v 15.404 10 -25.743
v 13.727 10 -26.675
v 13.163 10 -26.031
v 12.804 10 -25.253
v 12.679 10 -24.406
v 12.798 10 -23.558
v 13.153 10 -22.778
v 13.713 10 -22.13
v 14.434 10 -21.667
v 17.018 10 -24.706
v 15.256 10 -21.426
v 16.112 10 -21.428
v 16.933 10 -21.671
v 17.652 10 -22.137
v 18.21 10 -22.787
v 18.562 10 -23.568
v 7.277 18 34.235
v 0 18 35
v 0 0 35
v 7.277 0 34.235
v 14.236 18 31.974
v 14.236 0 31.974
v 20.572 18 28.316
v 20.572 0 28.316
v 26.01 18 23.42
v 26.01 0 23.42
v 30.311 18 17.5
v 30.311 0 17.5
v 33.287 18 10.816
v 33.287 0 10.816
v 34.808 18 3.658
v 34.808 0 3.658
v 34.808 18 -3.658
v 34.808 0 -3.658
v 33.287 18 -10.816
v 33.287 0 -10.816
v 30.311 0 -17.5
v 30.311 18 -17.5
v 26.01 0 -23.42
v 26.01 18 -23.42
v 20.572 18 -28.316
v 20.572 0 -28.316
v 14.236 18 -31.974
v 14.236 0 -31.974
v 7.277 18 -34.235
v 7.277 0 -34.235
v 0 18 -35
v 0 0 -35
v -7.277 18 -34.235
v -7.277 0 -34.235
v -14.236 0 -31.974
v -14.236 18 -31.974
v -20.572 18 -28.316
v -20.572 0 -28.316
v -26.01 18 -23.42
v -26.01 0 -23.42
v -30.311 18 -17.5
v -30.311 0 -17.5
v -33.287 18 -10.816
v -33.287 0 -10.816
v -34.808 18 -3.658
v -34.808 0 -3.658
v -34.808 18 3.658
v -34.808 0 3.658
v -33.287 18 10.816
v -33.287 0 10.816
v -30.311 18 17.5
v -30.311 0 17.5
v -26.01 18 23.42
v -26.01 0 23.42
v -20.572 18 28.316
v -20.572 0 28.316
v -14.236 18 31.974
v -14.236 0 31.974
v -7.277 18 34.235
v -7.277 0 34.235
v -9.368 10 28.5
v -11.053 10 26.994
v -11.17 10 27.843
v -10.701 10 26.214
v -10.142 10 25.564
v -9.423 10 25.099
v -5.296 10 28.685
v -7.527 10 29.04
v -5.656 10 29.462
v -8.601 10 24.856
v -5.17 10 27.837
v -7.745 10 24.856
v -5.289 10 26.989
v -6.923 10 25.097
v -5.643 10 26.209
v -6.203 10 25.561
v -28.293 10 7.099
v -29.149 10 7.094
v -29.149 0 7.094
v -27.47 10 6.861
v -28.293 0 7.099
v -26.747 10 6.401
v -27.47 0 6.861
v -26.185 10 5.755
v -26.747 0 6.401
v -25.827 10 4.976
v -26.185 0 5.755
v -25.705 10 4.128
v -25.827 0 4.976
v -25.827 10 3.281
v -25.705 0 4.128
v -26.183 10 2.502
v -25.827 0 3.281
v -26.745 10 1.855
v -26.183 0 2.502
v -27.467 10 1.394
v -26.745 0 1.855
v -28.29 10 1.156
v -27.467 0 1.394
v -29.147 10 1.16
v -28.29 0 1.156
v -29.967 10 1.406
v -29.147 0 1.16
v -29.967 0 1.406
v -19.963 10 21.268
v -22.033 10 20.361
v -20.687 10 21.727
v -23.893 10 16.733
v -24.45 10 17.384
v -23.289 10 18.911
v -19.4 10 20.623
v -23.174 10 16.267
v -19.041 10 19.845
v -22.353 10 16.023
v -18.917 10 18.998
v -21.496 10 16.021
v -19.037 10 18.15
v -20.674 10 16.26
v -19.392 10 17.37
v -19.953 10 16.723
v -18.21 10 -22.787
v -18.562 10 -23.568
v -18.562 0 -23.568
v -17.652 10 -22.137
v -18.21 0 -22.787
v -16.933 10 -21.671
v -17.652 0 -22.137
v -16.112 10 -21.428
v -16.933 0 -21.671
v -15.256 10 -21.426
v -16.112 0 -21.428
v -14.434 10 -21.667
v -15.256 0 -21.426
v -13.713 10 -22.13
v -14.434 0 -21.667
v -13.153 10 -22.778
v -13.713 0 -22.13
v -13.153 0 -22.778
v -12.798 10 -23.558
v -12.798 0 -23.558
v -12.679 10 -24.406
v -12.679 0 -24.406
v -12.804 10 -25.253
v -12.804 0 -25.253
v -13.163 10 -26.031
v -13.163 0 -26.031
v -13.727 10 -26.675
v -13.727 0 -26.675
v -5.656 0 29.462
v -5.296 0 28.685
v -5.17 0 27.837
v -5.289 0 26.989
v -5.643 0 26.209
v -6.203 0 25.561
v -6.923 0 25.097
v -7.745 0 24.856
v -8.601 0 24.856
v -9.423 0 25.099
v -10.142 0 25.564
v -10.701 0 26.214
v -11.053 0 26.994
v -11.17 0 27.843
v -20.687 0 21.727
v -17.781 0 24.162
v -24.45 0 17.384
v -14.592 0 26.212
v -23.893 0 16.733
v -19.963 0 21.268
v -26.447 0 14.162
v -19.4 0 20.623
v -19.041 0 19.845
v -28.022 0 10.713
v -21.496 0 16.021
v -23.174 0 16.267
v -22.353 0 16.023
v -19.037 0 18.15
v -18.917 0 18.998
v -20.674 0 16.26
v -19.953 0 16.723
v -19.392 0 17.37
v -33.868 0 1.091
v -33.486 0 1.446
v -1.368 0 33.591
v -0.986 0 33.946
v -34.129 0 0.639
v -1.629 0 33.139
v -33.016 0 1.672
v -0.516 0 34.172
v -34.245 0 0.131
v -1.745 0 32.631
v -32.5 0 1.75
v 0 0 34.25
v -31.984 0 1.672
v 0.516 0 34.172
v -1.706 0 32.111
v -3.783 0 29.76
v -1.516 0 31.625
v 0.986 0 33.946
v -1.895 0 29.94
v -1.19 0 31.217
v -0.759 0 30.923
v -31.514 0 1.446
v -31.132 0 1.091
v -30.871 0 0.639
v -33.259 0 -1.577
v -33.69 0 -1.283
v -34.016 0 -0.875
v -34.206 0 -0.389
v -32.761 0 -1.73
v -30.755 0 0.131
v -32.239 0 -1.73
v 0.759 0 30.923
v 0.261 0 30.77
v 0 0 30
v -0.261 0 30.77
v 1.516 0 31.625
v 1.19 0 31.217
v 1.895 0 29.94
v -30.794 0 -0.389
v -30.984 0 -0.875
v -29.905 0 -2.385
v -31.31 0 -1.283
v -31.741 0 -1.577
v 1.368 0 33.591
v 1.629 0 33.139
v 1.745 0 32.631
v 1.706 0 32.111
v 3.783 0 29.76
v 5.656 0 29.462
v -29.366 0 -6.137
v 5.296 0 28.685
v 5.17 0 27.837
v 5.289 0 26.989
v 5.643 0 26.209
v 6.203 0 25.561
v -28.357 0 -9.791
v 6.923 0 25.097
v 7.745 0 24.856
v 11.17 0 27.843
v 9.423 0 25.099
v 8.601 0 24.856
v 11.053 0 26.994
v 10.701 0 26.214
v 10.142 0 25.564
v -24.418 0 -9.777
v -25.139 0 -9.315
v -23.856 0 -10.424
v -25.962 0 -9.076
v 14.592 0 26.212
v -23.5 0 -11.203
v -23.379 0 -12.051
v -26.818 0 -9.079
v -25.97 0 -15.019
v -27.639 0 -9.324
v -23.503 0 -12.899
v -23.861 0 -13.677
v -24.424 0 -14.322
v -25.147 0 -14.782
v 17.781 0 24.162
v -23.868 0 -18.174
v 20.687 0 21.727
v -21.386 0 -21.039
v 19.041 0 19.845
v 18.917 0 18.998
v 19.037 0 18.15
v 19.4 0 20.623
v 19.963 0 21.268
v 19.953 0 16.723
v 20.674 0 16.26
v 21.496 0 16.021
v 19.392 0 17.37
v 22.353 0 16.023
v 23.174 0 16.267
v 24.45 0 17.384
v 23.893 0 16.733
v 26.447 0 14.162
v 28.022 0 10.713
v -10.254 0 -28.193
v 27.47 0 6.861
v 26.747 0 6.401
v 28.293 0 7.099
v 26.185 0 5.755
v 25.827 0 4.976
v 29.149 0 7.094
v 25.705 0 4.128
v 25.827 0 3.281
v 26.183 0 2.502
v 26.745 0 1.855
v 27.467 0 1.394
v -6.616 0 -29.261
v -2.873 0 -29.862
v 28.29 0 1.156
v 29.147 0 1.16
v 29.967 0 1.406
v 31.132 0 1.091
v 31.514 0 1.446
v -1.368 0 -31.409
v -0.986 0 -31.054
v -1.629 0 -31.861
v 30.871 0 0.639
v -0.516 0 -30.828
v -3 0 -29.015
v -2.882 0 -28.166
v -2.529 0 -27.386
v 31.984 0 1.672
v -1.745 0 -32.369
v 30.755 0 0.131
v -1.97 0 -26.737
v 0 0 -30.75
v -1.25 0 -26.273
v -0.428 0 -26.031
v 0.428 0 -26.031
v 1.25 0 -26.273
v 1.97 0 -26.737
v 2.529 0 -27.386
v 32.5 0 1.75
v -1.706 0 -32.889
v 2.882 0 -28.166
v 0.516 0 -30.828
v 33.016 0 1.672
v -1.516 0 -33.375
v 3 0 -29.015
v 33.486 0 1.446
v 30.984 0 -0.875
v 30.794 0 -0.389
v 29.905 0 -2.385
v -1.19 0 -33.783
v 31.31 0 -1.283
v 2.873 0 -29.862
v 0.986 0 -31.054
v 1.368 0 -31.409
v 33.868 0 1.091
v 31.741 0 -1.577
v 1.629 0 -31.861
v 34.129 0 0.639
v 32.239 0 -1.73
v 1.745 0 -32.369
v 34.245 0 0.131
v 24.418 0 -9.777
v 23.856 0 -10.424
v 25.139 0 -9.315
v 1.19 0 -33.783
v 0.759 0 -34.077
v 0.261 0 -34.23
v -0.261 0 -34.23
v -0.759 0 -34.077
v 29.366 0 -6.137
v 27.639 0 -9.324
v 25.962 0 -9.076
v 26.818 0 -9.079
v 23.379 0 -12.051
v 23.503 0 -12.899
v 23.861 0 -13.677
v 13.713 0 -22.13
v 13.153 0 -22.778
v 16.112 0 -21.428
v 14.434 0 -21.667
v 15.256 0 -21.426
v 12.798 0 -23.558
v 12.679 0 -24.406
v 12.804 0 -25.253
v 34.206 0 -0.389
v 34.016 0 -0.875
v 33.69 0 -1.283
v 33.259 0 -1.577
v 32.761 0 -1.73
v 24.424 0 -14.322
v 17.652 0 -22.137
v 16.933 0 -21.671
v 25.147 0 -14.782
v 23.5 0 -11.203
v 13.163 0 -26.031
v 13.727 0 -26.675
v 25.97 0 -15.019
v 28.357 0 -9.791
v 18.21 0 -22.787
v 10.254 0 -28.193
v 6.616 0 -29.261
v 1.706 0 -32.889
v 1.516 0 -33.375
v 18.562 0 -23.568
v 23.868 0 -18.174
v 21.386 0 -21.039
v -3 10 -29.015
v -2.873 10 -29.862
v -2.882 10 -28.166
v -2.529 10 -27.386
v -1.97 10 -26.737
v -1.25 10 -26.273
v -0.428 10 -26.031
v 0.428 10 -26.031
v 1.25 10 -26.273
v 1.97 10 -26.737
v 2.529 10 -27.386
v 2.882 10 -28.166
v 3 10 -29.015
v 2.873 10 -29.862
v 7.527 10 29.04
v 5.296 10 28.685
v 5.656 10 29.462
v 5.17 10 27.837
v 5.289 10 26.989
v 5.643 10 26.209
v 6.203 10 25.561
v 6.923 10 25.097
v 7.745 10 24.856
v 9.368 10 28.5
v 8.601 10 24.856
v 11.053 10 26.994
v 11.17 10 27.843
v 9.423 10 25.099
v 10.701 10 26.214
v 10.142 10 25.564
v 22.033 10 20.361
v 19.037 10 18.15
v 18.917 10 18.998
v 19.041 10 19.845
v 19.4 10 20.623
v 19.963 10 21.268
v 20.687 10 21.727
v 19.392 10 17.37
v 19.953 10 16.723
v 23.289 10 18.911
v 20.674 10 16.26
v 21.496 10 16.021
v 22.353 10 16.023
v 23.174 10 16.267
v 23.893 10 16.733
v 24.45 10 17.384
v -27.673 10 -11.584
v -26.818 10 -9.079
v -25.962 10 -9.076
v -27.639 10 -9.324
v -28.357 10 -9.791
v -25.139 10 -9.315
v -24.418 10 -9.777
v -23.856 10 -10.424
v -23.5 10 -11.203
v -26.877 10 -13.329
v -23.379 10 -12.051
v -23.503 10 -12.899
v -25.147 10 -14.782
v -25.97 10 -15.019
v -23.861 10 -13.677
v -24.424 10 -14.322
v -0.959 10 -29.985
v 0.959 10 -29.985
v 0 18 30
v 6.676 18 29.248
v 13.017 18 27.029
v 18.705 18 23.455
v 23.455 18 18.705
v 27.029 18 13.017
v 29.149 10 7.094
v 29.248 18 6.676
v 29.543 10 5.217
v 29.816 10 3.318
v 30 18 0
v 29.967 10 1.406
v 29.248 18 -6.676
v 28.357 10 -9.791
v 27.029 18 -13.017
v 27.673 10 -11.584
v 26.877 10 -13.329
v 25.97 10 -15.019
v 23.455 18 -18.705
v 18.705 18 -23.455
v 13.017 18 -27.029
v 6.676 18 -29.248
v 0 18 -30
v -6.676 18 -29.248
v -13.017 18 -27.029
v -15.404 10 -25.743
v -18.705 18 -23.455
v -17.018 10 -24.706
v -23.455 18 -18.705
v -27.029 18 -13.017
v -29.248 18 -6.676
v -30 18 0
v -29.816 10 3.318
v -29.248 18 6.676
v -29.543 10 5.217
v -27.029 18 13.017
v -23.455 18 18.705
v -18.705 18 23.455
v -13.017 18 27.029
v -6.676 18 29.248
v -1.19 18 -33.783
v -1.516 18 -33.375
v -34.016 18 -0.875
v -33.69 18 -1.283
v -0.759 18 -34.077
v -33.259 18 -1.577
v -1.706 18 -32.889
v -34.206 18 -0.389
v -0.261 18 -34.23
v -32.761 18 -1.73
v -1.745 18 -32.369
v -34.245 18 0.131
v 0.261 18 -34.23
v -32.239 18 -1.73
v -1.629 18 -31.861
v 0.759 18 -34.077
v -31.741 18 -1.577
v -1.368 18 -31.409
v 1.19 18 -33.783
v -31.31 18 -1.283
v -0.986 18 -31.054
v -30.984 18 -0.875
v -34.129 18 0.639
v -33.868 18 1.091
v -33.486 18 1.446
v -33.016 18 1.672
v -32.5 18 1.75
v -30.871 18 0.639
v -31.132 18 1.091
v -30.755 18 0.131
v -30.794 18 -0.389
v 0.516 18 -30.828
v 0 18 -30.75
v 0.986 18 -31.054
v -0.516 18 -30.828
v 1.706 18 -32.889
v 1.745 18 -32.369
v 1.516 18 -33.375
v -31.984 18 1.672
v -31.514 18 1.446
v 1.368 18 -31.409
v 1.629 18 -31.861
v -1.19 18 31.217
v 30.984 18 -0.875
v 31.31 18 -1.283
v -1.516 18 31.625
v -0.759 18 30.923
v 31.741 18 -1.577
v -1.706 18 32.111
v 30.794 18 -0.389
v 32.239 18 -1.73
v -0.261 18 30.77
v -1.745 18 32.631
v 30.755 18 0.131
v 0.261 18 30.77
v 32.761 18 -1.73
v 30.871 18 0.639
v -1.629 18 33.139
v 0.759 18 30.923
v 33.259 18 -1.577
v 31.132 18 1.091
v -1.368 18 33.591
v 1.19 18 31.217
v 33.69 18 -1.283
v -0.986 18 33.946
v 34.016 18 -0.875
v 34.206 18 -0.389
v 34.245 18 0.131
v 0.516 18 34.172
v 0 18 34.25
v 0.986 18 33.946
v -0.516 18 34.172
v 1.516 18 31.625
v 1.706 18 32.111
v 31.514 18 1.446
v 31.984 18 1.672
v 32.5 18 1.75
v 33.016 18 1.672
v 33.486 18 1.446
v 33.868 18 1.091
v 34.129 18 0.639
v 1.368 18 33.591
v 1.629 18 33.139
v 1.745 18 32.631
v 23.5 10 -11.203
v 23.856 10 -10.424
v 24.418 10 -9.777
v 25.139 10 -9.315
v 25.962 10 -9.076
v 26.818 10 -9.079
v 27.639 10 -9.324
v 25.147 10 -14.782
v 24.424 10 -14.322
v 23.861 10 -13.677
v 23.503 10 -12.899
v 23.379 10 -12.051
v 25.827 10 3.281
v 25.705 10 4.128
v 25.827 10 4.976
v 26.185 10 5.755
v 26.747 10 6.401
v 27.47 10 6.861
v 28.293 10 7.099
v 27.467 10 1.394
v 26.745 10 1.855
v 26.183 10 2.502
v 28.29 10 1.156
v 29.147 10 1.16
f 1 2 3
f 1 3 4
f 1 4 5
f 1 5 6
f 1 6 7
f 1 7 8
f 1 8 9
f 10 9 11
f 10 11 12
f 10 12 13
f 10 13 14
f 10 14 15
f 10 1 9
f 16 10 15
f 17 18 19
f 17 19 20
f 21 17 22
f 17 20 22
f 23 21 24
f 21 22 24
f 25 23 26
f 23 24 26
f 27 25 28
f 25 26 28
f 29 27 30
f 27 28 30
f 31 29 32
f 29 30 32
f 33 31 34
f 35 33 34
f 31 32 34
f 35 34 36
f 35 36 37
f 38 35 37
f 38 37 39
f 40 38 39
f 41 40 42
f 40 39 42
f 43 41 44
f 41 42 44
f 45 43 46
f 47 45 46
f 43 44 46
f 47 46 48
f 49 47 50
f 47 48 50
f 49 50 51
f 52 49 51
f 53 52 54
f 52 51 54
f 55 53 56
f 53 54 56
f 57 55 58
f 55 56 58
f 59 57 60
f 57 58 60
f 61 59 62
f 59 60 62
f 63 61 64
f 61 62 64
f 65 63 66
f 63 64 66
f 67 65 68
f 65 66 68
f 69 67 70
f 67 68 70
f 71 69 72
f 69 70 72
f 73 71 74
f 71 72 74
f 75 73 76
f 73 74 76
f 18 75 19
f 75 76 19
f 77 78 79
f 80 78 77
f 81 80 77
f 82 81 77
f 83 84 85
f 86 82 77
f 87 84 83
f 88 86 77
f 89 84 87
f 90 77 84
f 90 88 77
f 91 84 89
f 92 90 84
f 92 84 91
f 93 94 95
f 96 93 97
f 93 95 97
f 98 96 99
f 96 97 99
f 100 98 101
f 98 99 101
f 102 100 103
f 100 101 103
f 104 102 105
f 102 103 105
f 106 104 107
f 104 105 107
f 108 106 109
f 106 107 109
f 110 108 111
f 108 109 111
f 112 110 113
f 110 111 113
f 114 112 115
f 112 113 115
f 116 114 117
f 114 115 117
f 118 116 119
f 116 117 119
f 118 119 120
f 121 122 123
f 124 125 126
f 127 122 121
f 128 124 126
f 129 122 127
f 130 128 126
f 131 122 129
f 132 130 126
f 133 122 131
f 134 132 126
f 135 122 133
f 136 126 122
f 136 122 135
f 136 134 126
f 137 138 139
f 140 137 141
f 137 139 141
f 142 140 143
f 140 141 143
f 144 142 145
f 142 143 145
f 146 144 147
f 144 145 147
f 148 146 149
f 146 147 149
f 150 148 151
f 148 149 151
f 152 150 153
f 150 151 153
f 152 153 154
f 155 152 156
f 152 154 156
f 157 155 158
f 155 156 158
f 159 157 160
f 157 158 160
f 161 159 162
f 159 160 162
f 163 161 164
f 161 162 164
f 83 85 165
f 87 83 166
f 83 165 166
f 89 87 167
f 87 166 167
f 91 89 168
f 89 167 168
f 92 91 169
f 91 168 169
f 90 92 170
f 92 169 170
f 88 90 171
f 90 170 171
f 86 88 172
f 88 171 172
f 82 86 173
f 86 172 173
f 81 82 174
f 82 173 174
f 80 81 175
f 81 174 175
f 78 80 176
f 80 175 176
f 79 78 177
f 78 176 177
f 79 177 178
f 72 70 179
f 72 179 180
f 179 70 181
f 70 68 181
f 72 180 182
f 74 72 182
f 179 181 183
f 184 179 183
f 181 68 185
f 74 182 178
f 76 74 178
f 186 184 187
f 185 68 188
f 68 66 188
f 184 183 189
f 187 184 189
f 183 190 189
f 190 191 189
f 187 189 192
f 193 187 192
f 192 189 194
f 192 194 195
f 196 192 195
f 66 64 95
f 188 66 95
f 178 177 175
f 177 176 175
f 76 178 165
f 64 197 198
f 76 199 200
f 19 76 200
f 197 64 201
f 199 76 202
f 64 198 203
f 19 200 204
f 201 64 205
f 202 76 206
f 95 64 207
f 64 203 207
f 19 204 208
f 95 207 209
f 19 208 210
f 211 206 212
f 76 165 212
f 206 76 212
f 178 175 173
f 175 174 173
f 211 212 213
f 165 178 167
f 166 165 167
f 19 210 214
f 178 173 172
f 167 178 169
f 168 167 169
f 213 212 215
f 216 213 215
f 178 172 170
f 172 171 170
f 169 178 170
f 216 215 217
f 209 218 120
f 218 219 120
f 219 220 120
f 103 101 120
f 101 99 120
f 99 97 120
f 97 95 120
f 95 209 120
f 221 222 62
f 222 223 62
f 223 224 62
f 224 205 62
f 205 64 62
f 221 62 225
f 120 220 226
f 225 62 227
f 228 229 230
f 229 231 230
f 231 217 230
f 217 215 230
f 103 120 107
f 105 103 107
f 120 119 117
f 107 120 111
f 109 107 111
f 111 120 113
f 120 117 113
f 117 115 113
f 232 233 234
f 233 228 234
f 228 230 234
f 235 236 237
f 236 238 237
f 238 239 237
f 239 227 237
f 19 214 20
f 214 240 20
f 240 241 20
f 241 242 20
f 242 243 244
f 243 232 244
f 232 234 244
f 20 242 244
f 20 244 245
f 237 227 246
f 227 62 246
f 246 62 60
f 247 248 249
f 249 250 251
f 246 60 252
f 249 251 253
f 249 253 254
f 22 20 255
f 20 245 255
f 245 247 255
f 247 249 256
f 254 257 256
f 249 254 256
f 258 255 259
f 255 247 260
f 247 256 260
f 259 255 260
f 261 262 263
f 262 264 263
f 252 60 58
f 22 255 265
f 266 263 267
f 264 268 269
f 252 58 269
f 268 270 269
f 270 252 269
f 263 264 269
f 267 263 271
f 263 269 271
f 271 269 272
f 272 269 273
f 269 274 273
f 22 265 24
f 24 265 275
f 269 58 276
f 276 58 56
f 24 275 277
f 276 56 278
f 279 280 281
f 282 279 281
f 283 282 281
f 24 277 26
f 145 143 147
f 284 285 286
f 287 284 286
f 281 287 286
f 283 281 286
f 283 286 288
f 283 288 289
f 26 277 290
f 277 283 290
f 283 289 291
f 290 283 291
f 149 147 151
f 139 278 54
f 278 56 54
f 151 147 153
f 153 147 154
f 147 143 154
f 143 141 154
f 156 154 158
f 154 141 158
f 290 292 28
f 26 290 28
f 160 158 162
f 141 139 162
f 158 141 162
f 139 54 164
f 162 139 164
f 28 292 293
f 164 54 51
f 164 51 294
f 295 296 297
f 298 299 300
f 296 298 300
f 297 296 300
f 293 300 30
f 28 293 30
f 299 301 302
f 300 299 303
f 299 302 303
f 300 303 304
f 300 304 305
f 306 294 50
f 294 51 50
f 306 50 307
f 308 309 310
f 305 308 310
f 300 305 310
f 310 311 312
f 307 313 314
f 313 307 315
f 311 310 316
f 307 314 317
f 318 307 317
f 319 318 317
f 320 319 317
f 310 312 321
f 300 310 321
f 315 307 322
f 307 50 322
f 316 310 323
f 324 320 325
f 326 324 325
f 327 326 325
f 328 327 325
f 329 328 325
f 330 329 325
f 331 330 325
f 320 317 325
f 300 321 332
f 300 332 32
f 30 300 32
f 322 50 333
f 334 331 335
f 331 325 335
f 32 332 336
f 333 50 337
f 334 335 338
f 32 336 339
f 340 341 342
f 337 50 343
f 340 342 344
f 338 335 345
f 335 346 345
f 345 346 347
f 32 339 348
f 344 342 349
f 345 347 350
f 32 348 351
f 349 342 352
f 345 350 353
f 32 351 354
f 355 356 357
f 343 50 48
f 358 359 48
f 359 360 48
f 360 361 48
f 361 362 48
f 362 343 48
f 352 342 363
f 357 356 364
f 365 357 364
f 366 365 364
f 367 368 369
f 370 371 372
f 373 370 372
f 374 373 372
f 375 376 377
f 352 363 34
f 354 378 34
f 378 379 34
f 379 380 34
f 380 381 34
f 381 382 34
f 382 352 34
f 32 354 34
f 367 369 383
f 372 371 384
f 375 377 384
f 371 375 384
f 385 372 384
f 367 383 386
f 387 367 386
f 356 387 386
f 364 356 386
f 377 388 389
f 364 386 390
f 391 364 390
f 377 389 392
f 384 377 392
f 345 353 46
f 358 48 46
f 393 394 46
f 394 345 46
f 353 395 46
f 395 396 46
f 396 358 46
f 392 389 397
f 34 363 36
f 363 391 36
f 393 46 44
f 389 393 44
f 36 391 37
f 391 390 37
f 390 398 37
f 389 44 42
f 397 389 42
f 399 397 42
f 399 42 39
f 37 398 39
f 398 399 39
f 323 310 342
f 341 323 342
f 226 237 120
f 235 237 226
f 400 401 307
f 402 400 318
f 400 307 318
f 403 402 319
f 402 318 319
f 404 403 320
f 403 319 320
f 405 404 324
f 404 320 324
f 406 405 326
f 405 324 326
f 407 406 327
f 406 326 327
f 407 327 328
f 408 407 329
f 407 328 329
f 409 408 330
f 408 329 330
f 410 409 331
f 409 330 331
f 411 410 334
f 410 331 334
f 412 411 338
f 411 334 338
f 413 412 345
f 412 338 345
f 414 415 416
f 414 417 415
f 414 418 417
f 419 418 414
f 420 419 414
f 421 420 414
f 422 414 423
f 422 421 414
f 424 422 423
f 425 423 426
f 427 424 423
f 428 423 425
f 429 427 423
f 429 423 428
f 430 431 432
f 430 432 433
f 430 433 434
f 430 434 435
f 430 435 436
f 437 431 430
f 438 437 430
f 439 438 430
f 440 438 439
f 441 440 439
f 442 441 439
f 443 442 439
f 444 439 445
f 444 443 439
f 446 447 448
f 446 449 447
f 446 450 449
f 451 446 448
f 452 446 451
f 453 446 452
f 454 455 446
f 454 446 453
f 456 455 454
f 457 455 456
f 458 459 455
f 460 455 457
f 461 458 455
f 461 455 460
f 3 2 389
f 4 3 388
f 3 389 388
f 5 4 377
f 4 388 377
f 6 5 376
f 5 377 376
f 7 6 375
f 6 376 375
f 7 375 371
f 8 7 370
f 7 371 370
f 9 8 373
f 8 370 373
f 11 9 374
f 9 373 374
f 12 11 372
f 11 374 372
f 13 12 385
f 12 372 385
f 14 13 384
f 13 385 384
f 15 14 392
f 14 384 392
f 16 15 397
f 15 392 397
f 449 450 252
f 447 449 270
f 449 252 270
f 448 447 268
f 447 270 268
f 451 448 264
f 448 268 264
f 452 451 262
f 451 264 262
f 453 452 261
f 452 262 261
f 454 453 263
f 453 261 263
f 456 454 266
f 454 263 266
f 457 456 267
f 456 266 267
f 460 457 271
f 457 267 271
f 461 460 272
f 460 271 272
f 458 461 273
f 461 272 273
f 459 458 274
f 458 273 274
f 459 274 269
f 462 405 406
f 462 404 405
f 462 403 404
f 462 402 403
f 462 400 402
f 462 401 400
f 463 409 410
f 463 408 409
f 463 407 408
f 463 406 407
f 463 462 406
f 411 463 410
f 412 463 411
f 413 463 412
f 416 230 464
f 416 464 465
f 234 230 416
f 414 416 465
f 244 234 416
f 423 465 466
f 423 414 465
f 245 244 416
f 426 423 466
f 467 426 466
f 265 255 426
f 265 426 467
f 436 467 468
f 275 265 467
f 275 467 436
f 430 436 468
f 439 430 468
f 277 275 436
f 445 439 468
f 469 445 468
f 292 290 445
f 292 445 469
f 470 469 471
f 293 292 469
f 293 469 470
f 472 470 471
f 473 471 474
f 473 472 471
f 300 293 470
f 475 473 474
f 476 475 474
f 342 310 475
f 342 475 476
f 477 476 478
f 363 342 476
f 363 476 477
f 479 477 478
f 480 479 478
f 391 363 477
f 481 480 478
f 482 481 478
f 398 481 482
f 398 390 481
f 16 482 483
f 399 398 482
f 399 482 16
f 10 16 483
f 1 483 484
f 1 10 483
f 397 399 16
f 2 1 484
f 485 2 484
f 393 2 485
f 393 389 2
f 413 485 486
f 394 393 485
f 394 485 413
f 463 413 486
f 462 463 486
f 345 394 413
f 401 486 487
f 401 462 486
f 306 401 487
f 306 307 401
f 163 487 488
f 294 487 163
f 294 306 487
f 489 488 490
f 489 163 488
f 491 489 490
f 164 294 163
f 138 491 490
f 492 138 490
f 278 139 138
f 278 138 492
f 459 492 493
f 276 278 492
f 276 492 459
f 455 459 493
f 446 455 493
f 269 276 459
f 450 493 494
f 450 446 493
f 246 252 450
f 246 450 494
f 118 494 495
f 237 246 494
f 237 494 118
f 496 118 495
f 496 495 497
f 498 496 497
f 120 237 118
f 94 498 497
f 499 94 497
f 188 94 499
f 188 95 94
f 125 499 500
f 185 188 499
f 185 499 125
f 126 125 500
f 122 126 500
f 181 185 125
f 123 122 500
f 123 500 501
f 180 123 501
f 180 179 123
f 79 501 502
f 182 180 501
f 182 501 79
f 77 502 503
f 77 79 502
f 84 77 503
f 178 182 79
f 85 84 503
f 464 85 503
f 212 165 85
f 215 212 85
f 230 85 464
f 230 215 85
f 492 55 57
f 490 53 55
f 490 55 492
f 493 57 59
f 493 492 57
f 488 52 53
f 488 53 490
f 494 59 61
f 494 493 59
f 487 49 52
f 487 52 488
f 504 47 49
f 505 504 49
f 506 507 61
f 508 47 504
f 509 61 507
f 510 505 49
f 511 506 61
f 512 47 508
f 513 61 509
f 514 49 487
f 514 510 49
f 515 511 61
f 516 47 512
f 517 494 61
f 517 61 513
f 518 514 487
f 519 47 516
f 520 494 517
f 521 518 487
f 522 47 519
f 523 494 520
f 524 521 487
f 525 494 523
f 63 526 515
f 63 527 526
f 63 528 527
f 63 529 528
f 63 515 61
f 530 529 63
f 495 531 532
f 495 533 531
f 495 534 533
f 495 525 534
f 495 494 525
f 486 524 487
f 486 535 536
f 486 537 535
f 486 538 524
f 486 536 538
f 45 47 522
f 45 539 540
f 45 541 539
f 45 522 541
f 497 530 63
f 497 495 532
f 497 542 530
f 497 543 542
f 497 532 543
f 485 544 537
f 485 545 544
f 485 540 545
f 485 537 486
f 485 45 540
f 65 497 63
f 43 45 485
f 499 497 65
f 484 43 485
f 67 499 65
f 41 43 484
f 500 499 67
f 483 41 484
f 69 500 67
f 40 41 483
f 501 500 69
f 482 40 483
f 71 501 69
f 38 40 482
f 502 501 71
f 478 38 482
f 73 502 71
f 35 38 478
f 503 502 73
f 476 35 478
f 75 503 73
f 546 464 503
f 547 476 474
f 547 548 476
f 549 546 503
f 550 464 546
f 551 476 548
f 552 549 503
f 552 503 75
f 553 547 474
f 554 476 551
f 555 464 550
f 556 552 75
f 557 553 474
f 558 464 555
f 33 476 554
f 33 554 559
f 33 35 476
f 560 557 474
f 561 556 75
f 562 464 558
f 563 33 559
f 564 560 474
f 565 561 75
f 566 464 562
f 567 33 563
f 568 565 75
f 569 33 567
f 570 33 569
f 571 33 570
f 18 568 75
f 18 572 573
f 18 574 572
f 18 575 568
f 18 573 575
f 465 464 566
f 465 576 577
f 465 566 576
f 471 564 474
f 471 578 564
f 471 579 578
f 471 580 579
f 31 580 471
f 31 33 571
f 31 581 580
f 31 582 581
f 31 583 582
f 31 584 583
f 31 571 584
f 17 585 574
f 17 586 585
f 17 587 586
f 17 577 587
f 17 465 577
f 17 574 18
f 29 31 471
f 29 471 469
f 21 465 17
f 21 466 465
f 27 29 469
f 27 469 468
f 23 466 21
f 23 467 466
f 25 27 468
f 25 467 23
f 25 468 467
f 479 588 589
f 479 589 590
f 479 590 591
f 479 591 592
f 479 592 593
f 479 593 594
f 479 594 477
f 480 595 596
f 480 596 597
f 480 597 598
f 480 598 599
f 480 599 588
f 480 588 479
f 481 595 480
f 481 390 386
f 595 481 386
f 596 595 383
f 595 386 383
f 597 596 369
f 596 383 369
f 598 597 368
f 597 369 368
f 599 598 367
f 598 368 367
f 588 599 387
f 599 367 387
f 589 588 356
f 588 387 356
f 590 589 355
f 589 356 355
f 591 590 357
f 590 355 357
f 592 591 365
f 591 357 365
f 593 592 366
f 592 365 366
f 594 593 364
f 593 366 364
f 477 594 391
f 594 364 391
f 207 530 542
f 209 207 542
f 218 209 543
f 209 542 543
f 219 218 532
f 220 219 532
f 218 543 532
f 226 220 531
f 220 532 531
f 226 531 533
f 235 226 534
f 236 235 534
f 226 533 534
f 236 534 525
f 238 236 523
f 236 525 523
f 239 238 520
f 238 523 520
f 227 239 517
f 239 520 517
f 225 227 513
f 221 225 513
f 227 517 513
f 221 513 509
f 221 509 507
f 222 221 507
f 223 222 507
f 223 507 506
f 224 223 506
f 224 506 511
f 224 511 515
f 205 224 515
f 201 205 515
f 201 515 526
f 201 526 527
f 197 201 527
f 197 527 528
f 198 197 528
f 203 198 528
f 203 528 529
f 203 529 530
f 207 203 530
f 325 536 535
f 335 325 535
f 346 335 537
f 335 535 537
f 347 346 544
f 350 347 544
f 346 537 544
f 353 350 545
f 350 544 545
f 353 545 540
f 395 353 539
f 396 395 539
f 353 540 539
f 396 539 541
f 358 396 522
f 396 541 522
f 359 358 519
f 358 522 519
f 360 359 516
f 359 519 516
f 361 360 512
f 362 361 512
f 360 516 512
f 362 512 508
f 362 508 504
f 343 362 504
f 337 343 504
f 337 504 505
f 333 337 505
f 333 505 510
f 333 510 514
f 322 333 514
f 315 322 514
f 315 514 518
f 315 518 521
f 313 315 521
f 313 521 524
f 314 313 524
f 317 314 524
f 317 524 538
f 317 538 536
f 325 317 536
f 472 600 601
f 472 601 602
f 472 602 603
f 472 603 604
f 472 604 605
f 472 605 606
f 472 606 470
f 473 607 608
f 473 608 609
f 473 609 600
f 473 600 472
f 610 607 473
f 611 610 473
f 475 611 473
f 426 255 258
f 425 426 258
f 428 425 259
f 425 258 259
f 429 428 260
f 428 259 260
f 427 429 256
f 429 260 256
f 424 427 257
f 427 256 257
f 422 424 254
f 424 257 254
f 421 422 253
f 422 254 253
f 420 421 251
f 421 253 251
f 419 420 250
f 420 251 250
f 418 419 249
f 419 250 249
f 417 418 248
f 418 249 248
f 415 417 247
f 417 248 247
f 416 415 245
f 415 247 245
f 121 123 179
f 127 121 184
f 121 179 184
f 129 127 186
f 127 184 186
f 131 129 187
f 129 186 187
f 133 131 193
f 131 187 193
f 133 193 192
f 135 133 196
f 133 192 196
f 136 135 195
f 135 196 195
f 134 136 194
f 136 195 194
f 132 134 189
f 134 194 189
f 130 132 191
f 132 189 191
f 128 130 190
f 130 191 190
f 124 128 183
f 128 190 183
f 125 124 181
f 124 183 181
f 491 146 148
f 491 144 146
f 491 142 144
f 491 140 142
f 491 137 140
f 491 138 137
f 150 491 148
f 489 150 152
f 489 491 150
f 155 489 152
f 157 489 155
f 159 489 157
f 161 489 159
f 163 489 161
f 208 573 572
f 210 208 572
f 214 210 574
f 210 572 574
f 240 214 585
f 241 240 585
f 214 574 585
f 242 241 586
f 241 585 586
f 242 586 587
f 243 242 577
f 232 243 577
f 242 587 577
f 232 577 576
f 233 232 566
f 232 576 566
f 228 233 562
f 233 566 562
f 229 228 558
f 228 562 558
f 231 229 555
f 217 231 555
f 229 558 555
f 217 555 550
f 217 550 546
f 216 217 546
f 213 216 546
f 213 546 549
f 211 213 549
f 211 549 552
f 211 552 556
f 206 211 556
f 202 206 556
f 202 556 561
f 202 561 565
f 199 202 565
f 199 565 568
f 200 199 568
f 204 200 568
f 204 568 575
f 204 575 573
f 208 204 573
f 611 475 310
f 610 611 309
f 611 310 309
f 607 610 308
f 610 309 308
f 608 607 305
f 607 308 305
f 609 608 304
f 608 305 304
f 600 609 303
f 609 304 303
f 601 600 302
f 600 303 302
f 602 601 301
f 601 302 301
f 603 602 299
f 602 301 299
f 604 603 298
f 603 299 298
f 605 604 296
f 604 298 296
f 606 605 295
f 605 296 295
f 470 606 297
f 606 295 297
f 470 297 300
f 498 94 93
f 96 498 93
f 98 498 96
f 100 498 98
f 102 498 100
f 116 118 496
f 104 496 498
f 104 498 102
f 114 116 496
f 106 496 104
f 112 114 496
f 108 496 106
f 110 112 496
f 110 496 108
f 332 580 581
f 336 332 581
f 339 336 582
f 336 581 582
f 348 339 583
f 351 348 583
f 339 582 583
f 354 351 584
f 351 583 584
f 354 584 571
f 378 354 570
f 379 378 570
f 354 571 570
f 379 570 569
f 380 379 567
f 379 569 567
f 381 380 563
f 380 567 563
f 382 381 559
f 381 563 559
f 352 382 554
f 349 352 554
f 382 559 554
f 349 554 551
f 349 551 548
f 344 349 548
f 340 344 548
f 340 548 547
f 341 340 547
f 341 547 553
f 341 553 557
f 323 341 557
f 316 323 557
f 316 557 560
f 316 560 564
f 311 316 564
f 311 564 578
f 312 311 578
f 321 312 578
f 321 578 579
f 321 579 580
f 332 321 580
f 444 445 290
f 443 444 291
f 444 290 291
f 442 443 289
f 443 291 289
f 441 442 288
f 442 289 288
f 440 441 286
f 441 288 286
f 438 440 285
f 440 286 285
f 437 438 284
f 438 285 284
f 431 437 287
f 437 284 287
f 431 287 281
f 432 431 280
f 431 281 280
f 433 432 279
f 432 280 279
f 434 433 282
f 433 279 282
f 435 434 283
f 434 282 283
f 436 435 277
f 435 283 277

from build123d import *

# Parameters (mm, degrees)
SKETCH1_R           = 35
SKETCH1_R_2         = 30
BOSS_EXTRUDE1_DEPTH = 18
SKETCH2_R           = 3
BOSS_EXTRUDE2_DEPTH = 10
SKETCH3_R           = 1.75
CUT_EXTRUDE1_DEPTH  = 53.668776329


with BuildPart() as part:
    # Sketch1 → Boss-Extrude1 (new body)
    with BuildSketch(Plane(origin=(0, 0, 0), x_dir=(1, 0, 0), z_dir=(0, 1, 0))):
        with Locations(Location((0, 0, 0), (0, 0, 270))):
            Circle(SKETCH1_R)
        with Locations(Location((0, 0, 0), (0, 0, 270))):
            Circle(SKETCH1_R_2, mode=Mode.SUBTRACT)
    extrude(amount=BOSS_EXTRUDE1_DEPTH)

    # Sketch2 → Boss-Extrude2 (add)
    with BuildSketch(Plane(origin=(0, 0, 0), x_dir=(1, 0, 0), z_dir=(0, 1, 0))):
        with Locations((0, 29)):
            Circle(SKETCH2_R)
        with Locations((15.678583706, 24.396352452)):
            Circle(SKETCH2_R)
        with Locations((26.379327865, 12.047035377)):
            Circle(SKETCH2_R)
        with Locations((28.704821815, -4.12713031)):
            Circle(SKETCH2_R)
        with Locations((21.916737656, -18.990961284)):
            Circle(SKETCH2_R)
        with Locations((8.170244148, -27.825296235)):
            Circle(SKETCH2_R)
        with Locations((-8.170244148, -27.825296235)):
            Circle(SKETCH2_R)
        with Locations((-21.916737656, -18.990961284)):
            Circle(SKETCH2_R)
        with Locations((-28.704821815, -4.12713031)):
            Circle(SKETCH2_R)
        with Locations((-26.379327865, 12.047035377)):
            Circle(SKETCH2_R)
        with Locations((-15.678583706, 24.396352452)):
            Circle(SKETCH2_R)
    extrude(amount=BOSS_EXTRUDE2_DEPTH)

    # Sketch3 → Cut-Extrude1 (cut, through all)
    with BuildSketch(Plane(origin=(0, 18, 0), x_dir=(1, 0, 0), z_dir=(0, 1, 0))):
        with Locations(Location((0, 32.5, 0), (0, 0, 270))):
            Circle(SKETCH3_R)
        with Locations(Location((32.5, 0, 0), (0, 0, 270))):
            Circle(SKETCH3_R)
        with Locations(Location((0, -32.5, 0), (0, 0, 270))):
            Circle(SKETCH3_R)
        with Locations(Location((-32.5, 0, 0), (0, 0, 270))):
            Circle(SKETCH3_R)
    extrude(amount=-CUT_EXTRUDE1_DEPTH, mode=Mode.SUBTRACT)


solid = part.part
